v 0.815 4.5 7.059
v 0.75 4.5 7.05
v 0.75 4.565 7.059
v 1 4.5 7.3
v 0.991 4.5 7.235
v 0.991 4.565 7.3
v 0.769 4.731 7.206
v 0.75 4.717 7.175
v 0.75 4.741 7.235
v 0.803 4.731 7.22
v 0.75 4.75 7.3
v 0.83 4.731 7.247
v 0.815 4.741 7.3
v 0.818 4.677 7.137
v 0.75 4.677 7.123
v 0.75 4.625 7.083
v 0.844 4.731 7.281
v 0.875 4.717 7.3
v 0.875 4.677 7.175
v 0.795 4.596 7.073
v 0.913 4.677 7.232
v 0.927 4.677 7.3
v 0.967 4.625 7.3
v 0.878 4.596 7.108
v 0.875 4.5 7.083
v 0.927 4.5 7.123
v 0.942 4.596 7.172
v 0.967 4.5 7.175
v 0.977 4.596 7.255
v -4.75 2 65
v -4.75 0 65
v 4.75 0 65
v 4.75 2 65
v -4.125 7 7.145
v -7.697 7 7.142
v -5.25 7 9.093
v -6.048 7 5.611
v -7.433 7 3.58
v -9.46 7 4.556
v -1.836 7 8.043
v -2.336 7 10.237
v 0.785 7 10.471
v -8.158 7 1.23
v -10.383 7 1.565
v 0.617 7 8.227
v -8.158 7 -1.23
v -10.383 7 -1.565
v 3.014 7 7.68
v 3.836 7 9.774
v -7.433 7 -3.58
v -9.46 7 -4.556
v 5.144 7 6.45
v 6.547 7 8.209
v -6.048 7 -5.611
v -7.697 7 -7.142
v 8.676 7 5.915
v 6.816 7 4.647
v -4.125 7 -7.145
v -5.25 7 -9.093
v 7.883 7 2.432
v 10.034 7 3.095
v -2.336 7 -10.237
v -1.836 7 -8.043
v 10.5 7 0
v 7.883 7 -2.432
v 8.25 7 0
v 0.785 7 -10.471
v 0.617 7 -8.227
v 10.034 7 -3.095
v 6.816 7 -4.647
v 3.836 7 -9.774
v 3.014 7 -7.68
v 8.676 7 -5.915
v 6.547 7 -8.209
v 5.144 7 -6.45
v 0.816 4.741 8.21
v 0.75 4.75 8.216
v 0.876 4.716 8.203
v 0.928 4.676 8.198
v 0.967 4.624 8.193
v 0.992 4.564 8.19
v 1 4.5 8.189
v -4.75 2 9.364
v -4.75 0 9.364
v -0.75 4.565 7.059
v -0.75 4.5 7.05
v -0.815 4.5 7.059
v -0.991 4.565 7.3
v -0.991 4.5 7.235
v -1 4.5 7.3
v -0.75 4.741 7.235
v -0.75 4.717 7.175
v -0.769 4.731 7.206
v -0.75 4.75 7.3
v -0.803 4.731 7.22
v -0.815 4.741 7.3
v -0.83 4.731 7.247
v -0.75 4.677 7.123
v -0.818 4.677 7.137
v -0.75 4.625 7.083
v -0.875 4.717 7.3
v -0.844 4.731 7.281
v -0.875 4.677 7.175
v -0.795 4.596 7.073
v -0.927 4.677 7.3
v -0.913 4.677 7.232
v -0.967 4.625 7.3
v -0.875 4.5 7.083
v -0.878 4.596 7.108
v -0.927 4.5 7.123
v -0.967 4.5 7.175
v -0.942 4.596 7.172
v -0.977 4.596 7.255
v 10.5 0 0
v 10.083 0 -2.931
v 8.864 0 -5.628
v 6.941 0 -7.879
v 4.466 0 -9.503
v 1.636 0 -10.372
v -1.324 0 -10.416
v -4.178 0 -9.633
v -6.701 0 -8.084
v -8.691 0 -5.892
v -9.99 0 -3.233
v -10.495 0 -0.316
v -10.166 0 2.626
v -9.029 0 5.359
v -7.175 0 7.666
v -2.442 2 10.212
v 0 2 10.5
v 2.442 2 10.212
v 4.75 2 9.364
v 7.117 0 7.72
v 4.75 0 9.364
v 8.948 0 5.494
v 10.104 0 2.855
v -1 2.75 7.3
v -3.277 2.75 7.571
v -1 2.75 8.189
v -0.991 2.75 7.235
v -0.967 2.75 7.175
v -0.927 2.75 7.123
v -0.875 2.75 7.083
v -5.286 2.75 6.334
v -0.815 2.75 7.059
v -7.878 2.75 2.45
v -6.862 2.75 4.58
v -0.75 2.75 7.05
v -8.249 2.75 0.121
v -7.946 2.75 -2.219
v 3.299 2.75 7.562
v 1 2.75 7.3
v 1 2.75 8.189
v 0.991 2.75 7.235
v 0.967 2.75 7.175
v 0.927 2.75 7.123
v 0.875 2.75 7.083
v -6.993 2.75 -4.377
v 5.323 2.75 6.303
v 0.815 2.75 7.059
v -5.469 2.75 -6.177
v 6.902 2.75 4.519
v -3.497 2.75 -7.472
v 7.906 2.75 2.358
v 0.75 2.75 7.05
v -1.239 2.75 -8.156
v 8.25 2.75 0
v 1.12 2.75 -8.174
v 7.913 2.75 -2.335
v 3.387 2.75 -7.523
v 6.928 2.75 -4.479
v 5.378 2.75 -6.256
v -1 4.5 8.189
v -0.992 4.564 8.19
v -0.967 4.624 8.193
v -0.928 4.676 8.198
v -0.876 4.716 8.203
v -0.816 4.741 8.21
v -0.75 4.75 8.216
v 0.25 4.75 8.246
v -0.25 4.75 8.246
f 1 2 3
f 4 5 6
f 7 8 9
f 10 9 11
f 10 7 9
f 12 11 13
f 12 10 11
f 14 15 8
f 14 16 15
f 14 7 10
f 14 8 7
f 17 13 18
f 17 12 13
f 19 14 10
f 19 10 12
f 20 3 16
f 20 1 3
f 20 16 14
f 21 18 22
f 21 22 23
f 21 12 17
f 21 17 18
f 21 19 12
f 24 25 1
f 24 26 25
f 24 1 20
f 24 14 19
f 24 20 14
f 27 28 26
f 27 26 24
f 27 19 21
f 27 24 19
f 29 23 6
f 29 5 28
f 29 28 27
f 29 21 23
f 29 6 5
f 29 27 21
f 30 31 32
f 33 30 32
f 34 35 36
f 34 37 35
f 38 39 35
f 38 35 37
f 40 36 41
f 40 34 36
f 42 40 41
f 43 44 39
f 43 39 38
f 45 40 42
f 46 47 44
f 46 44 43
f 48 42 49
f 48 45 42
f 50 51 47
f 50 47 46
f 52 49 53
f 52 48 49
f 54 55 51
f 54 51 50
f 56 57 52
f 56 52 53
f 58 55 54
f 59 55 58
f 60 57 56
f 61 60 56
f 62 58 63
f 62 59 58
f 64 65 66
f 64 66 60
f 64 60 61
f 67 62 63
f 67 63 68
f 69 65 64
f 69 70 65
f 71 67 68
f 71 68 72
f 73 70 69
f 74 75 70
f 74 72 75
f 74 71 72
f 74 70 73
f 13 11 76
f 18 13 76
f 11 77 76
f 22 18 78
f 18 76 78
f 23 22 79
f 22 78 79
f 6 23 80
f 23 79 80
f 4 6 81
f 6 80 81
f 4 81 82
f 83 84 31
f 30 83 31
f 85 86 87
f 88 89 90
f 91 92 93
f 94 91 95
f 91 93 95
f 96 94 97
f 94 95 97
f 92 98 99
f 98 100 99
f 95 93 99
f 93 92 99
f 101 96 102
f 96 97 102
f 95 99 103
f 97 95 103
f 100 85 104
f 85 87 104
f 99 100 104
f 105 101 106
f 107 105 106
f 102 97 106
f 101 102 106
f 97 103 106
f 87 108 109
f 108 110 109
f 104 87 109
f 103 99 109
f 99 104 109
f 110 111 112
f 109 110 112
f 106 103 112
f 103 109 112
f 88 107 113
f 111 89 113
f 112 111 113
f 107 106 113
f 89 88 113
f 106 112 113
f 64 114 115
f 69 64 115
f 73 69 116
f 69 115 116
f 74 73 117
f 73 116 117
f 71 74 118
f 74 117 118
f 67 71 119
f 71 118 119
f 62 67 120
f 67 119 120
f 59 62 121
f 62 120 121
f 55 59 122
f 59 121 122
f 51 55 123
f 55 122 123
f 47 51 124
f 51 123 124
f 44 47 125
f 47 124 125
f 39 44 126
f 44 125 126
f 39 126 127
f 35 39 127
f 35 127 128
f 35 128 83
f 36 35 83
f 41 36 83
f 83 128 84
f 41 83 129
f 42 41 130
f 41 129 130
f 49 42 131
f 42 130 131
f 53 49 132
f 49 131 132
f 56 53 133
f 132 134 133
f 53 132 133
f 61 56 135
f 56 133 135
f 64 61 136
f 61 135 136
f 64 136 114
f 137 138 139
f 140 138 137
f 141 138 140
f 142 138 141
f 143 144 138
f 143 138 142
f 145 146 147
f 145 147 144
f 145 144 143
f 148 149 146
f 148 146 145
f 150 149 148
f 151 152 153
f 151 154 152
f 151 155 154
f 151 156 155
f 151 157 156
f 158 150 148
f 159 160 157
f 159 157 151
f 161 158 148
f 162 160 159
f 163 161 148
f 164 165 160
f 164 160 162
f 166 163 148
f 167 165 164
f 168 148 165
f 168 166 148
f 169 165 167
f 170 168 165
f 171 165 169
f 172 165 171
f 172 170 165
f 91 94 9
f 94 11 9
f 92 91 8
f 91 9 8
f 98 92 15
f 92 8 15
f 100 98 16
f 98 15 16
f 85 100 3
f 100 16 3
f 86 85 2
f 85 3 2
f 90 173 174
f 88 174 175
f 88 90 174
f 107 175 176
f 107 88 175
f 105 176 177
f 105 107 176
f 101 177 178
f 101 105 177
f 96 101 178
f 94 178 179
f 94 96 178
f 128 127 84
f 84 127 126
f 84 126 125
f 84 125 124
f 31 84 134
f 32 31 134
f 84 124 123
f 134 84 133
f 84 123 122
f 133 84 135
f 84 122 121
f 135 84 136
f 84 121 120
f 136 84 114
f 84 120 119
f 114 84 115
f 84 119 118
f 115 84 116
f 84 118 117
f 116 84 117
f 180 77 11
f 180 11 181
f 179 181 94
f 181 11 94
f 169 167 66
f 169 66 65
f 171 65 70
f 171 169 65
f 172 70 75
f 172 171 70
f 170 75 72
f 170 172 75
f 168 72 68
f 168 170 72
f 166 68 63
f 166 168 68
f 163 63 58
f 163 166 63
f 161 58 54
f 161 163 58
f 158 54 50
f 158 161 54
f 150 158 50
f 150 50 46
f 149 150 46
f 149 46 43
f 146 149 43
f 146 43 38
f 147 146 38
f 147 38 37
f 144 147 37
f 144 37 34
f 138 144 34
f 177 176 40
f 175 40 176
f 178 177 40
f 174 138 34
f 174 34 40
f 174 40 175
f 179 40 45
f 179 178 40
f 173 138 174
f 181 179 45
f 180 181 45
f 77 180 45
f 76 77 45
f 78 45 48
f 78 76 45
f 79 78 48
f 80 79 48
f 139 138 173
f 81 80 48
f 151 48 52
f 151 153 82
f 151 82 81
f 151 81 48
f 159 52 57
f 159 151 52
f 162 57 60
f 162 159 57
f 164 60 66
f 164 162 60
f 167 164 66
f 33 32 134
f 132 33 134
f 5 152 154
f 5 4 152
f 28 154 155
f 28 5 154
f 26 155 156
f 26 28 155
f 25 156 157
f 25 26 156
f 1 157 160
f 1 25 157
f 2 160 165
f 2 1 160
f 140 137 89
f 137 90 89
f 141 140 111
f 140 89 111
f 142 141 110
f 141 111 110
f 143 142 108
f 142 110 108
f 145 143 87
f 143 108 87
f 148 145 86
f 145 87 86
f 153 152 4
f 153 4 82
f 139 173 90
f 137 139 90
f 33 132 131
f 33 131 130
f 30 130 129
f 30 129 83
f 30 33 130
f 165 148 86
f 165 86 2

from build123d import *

# Parameters (mm, degrees)
F_0_1MM_FIT_FOR_POT_R = 10.5
BOSS_EXTRUDE1_DEPTH   = 2.75
SKETCH4_R             = 10.5
SKETCH4_R_2           = 8.25
BOSS_EXTRUDE2_DEPTH   = 4.25
BOSS_EXTRUDE3_DEPTH   = 2
FILLET1_R             = 0.25
BOSS_EXTRUDE4_DEPTH   = 2


with BuildPart() as part:
    # 0.1mm fit for pot → Boss-Extrude1 (new body)
    with BuildSketch(Plane(origin=(0, 0, 0), x_dir=(1, 0, 0), z_dir=(0, 1, 0))):
        Circle(F_0_1MM_FIT_FOR_POT_R)
    extrude(amount=BOSS_EXTRUDE1_DEPTH)

    # Sketch4 → Boss-Extrude2 (add)
    with BuildSketch(Plane(origin=(0, 2.75, 0), x_dir=(1, 0, 0), z_dir=(0, 1, 0))):
        Circle(SKETCH4_R)
        Circle(SKETCH4_R_2, mode=Mode.SUBTRACT)
    extrude(amount=BOSS_EXTRUDE2_DEPTH)

    # Sketch5 → Boss-Extrude3 (add)
    with BuildSketch(Plane(origin=(0, 2.75, 0), x_dir=(1, 0, 0), z_dir=(0, 1, 0))):
        with BuildLine():
            Line((-1, -8.189169677), (-1, -7.05))
            Line((-1, -7.05), (1, -7.05))
            Line((1, -7.05), (1, -8.189169677))
            ThreePointArc((1, -8.189169677), (0, -8.25), (-1, -8.189169677))
        make_face()
    extrude(amount=BOSS_EXTRUDE3_DEPTH)

    # Fillet1
    fillet1_edges = [part.edges().sort_by_distance(p)[0] for p in [
        (1, 3.75, 7.05),
        (-1, 3.75, 7.05),
        (0, 4.75, 7.05),
        (-1, 4.75, 7.619584839),
        (1, 4.75, 7.619584839),
    ]]
    fillet(fillet1_edges, radius=FILLET1_R)

    # Sketch6 → Boss-Extrude4 (add)
    with BuildSketch(Plane.XZ):
        with BuildLine():
            Line((-4.75, 9.3641604), (-4.75, 65))
            Line((-4.75, 65), (4.75, 65))
            Line((4.75, 65), (4.75, 9.3641604))
            ThreePointArc((4.75, 9.3641604), (0, 10.5), (-4.75, 9.3641604))
        make_face()
    extrude(amount=-BOSS_EXTRUDE4_DEPTH)


solid = part.part
